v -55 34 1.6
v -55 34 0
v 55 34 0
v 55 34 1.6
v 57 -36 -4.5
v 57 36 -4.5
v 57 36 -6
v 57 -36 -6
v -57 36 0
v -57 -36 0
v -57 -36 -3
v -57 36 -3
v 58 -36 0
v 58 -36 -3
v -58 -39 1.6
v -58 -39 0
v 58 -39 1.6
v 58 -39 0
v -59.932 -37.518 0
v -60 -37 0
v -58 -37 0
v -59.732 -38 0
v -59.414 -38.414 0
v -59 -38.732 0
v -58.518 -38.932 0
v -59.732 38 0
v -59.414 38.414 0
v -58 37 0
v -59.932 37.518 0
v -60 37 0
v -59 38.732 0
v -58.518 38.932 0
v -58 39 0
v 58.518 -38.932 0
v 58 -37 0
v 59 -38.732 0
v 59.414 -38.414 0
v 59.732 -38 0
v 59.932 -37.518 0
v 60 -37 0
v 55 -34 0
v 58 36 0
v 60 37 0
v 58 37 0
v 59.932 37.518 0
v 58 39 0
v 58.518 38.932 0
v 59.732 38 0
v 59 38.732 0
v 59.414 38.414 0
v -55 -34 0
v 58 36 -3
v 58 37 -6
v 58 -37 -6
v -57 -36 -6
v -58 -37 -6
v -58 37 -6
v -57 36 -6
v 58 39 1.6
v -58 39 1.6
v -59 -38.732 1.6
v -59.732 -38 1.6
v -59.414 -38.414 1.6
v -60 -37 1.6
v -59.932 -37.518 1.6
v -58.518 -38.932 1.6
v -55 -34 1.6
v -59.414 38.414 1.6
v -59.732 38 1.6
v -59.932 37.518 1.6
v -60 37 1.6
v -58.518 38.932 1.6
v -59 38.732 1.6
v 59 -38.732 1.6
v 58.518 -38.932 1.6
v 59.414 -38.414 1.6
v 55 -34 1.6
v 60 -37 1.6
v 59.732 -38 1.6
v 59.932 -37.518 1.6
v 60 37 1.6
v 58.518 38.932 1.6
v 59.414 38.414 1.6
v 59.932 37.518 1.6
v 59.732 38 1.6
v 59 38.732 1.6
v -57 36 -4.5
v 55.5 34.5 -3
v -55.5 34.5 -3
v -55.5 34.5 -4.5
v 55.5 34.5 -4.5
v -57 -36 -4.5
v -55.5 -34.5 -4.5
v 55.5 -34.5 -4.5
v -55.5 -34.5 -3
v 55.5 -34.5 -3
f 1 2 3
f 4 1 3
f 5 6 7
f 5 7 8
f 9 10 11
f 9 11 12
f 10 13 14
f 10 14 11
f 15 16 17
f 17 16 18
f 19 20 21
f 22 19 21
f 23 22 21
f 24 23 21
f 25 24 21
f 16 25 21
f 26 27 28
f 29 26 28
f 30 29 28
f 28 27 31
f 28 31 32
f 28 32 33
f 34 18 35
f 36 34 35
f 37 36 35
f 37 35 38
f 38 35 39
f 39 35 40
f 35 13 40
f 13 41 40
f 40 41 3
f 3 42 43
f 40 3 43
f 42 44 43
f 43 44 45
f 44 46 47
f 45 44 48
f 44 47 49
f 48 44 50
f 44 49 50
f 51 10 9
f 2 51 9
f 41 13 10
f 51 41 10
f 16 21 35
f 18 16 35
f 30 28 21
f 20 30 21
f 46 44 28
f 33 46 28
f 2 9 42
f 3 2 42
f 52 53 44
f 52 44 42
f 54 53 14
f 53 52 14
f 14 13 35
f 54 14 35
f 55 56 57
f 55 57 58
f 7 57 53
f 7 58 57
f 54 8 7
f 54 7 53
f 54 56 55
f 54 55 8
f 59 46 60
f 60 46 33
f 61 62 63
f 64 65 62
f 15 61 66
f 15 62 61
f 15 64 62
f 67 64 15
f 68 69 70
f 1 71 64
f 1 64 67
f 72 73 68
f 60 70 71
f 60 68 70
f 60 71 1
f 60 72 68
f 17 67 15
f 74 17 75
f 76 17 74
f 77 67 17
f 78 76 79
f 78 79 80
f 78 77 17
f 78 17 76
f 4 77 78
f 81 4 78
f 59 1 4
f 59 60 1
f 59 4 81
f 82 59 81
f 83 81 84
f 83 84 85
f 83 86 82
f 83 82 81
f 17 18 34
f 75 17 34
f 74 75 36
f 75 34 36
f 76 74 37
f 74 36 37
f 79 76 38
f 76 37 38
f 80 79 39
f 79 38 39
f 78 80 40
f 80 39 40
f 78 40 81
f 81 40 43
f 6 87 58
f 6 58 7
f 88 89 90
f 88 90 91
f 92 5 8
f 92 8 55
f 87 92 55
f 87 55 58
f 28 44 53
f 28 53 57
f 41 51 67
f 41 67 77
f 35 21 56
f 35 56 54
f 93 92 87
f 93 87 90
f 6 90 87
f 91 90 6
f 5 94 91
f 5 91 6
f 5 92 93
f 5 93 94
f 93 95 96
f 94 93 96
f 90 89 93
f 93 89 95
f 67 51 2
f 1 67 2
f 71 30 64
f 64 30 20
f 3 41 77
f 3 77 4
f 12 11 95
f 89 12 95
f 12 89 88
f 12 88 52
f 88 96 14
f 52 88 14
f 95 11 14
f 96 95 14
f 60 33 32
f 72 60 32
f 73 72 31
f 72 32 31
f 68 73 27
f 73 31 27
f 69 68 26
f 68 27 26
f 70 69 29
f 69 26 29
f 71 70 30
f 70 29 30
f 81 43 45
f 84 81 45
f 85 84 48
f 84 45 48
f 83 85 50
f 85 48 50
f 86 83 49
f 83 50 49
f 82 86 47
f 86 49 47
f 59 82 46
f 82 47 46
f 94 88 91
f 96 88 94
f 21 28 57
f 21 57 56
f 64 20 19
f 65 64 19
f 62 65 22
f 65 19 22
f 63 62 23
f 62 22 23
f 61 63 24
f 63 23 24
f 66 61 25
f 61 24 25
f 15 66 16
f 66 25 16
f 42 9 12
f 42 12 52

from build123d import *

# Parameters (mm, degrees)
F0_W     = 114
F0_H     = 72
F0_W_2   = 110
F0_H_2   = 68
F0_W_3   = 1
F1_DEPTH = 1.6
F2_DEPTH = 3
F3_W     = 114
F3_H     = 72
F3_W_2   = 111
F3_H_2   = 69
F4_DEPTH = 1.5
F5_DEPTH = 3
F3_W_3   = 1
F6_DEPTH = 3


with BuildPart() as f1:
    # F0 (on Top) → F1 (new body)
    with BuildSketch(Plane.XY):
        with BuildLine():
            Line((58, 39), (-58, 39))
            ThreePointArc((-58, 39), (-59.4142135624, 38.4142135624), (-60, 37))
            Line((-60, 37), (-60, -37))
            ThreePointArc((-60, -37), (-59.4142135624, -38.4142135624), (-58, -39))
            Line((-58, -39), (58, -39))
            ThreePointArc((58, -39), (59.4142135624, -38.4142135624), (60, -37))
            Line((60, -37), (60, 37))
            ThreePointArc((60, 37), (59.4142135624, 38.4142135624), (58, 39))
        make_face()
        Polygon((58, 37), (58, 36), (58, -36), (58, -37), (-58, -37), (-58, 37), align=None, mode=Mode.SUBTRACT)
        Polygon((-57, -36), (-57, 36), (57, 36), (58, 36), (58, 37), (-58, 37), (-58, -37), (58, -37), (58, -36), (57, -36), align=None)
        Rectangle(F0_W, F0_H)
        Rectangle(F0_W_2, F0_H_2, mode=Mode.SUBTRACT)
        with Locations((57.5, 0)):
            Rectangle(F0_W_3, F0_H)
    extrude(amount=F1_DEPTH)

    # F0 (on Top) → F2 (join)
    with BuildSketch(Plane.XY):
        Polygon((-57, -36), (-57, 36), (57, 36), (58, 36), (58, 37), (-58, 37), (-58, -37), (58, -37), (58, -36), (57, -36), align=None)
    extrude(amount=-F2_DEPTH)

    # F3 (on face) → F4 (join)
    with BuildSketch(Plane(origin=(0, 0, -3), x_dir=(1, 0, 0), z_dir=(0, 0, -1))):
        Rectangle(F3_W, F3_H)
        Rectangle(F3_W_2, F3_H_2, mode=Mode.SUBTRACT)
    extrude(amount=F4_DEPTH)

    # F5 (add): a face of the model
    f5_faces = [f1.faces().sort_by_distance(p)[0] for p in [
        (-57.1375936045, 0, -3),
    ]]
    extrude(f5_faces, amount=F5_DEPTH)

    # F3 (on face) → F6 (join)
    with BuildSketch(Plane(origin=(0, 0, -3), x_dir=(1, 0, 0), z_dir=(0, 0, -1))):
        with Locations((57.5, 0)):
            Rectangle(F3_W_3, F3_H)
    extrude(amount=F6_DEPTH)


solid = f1.part
